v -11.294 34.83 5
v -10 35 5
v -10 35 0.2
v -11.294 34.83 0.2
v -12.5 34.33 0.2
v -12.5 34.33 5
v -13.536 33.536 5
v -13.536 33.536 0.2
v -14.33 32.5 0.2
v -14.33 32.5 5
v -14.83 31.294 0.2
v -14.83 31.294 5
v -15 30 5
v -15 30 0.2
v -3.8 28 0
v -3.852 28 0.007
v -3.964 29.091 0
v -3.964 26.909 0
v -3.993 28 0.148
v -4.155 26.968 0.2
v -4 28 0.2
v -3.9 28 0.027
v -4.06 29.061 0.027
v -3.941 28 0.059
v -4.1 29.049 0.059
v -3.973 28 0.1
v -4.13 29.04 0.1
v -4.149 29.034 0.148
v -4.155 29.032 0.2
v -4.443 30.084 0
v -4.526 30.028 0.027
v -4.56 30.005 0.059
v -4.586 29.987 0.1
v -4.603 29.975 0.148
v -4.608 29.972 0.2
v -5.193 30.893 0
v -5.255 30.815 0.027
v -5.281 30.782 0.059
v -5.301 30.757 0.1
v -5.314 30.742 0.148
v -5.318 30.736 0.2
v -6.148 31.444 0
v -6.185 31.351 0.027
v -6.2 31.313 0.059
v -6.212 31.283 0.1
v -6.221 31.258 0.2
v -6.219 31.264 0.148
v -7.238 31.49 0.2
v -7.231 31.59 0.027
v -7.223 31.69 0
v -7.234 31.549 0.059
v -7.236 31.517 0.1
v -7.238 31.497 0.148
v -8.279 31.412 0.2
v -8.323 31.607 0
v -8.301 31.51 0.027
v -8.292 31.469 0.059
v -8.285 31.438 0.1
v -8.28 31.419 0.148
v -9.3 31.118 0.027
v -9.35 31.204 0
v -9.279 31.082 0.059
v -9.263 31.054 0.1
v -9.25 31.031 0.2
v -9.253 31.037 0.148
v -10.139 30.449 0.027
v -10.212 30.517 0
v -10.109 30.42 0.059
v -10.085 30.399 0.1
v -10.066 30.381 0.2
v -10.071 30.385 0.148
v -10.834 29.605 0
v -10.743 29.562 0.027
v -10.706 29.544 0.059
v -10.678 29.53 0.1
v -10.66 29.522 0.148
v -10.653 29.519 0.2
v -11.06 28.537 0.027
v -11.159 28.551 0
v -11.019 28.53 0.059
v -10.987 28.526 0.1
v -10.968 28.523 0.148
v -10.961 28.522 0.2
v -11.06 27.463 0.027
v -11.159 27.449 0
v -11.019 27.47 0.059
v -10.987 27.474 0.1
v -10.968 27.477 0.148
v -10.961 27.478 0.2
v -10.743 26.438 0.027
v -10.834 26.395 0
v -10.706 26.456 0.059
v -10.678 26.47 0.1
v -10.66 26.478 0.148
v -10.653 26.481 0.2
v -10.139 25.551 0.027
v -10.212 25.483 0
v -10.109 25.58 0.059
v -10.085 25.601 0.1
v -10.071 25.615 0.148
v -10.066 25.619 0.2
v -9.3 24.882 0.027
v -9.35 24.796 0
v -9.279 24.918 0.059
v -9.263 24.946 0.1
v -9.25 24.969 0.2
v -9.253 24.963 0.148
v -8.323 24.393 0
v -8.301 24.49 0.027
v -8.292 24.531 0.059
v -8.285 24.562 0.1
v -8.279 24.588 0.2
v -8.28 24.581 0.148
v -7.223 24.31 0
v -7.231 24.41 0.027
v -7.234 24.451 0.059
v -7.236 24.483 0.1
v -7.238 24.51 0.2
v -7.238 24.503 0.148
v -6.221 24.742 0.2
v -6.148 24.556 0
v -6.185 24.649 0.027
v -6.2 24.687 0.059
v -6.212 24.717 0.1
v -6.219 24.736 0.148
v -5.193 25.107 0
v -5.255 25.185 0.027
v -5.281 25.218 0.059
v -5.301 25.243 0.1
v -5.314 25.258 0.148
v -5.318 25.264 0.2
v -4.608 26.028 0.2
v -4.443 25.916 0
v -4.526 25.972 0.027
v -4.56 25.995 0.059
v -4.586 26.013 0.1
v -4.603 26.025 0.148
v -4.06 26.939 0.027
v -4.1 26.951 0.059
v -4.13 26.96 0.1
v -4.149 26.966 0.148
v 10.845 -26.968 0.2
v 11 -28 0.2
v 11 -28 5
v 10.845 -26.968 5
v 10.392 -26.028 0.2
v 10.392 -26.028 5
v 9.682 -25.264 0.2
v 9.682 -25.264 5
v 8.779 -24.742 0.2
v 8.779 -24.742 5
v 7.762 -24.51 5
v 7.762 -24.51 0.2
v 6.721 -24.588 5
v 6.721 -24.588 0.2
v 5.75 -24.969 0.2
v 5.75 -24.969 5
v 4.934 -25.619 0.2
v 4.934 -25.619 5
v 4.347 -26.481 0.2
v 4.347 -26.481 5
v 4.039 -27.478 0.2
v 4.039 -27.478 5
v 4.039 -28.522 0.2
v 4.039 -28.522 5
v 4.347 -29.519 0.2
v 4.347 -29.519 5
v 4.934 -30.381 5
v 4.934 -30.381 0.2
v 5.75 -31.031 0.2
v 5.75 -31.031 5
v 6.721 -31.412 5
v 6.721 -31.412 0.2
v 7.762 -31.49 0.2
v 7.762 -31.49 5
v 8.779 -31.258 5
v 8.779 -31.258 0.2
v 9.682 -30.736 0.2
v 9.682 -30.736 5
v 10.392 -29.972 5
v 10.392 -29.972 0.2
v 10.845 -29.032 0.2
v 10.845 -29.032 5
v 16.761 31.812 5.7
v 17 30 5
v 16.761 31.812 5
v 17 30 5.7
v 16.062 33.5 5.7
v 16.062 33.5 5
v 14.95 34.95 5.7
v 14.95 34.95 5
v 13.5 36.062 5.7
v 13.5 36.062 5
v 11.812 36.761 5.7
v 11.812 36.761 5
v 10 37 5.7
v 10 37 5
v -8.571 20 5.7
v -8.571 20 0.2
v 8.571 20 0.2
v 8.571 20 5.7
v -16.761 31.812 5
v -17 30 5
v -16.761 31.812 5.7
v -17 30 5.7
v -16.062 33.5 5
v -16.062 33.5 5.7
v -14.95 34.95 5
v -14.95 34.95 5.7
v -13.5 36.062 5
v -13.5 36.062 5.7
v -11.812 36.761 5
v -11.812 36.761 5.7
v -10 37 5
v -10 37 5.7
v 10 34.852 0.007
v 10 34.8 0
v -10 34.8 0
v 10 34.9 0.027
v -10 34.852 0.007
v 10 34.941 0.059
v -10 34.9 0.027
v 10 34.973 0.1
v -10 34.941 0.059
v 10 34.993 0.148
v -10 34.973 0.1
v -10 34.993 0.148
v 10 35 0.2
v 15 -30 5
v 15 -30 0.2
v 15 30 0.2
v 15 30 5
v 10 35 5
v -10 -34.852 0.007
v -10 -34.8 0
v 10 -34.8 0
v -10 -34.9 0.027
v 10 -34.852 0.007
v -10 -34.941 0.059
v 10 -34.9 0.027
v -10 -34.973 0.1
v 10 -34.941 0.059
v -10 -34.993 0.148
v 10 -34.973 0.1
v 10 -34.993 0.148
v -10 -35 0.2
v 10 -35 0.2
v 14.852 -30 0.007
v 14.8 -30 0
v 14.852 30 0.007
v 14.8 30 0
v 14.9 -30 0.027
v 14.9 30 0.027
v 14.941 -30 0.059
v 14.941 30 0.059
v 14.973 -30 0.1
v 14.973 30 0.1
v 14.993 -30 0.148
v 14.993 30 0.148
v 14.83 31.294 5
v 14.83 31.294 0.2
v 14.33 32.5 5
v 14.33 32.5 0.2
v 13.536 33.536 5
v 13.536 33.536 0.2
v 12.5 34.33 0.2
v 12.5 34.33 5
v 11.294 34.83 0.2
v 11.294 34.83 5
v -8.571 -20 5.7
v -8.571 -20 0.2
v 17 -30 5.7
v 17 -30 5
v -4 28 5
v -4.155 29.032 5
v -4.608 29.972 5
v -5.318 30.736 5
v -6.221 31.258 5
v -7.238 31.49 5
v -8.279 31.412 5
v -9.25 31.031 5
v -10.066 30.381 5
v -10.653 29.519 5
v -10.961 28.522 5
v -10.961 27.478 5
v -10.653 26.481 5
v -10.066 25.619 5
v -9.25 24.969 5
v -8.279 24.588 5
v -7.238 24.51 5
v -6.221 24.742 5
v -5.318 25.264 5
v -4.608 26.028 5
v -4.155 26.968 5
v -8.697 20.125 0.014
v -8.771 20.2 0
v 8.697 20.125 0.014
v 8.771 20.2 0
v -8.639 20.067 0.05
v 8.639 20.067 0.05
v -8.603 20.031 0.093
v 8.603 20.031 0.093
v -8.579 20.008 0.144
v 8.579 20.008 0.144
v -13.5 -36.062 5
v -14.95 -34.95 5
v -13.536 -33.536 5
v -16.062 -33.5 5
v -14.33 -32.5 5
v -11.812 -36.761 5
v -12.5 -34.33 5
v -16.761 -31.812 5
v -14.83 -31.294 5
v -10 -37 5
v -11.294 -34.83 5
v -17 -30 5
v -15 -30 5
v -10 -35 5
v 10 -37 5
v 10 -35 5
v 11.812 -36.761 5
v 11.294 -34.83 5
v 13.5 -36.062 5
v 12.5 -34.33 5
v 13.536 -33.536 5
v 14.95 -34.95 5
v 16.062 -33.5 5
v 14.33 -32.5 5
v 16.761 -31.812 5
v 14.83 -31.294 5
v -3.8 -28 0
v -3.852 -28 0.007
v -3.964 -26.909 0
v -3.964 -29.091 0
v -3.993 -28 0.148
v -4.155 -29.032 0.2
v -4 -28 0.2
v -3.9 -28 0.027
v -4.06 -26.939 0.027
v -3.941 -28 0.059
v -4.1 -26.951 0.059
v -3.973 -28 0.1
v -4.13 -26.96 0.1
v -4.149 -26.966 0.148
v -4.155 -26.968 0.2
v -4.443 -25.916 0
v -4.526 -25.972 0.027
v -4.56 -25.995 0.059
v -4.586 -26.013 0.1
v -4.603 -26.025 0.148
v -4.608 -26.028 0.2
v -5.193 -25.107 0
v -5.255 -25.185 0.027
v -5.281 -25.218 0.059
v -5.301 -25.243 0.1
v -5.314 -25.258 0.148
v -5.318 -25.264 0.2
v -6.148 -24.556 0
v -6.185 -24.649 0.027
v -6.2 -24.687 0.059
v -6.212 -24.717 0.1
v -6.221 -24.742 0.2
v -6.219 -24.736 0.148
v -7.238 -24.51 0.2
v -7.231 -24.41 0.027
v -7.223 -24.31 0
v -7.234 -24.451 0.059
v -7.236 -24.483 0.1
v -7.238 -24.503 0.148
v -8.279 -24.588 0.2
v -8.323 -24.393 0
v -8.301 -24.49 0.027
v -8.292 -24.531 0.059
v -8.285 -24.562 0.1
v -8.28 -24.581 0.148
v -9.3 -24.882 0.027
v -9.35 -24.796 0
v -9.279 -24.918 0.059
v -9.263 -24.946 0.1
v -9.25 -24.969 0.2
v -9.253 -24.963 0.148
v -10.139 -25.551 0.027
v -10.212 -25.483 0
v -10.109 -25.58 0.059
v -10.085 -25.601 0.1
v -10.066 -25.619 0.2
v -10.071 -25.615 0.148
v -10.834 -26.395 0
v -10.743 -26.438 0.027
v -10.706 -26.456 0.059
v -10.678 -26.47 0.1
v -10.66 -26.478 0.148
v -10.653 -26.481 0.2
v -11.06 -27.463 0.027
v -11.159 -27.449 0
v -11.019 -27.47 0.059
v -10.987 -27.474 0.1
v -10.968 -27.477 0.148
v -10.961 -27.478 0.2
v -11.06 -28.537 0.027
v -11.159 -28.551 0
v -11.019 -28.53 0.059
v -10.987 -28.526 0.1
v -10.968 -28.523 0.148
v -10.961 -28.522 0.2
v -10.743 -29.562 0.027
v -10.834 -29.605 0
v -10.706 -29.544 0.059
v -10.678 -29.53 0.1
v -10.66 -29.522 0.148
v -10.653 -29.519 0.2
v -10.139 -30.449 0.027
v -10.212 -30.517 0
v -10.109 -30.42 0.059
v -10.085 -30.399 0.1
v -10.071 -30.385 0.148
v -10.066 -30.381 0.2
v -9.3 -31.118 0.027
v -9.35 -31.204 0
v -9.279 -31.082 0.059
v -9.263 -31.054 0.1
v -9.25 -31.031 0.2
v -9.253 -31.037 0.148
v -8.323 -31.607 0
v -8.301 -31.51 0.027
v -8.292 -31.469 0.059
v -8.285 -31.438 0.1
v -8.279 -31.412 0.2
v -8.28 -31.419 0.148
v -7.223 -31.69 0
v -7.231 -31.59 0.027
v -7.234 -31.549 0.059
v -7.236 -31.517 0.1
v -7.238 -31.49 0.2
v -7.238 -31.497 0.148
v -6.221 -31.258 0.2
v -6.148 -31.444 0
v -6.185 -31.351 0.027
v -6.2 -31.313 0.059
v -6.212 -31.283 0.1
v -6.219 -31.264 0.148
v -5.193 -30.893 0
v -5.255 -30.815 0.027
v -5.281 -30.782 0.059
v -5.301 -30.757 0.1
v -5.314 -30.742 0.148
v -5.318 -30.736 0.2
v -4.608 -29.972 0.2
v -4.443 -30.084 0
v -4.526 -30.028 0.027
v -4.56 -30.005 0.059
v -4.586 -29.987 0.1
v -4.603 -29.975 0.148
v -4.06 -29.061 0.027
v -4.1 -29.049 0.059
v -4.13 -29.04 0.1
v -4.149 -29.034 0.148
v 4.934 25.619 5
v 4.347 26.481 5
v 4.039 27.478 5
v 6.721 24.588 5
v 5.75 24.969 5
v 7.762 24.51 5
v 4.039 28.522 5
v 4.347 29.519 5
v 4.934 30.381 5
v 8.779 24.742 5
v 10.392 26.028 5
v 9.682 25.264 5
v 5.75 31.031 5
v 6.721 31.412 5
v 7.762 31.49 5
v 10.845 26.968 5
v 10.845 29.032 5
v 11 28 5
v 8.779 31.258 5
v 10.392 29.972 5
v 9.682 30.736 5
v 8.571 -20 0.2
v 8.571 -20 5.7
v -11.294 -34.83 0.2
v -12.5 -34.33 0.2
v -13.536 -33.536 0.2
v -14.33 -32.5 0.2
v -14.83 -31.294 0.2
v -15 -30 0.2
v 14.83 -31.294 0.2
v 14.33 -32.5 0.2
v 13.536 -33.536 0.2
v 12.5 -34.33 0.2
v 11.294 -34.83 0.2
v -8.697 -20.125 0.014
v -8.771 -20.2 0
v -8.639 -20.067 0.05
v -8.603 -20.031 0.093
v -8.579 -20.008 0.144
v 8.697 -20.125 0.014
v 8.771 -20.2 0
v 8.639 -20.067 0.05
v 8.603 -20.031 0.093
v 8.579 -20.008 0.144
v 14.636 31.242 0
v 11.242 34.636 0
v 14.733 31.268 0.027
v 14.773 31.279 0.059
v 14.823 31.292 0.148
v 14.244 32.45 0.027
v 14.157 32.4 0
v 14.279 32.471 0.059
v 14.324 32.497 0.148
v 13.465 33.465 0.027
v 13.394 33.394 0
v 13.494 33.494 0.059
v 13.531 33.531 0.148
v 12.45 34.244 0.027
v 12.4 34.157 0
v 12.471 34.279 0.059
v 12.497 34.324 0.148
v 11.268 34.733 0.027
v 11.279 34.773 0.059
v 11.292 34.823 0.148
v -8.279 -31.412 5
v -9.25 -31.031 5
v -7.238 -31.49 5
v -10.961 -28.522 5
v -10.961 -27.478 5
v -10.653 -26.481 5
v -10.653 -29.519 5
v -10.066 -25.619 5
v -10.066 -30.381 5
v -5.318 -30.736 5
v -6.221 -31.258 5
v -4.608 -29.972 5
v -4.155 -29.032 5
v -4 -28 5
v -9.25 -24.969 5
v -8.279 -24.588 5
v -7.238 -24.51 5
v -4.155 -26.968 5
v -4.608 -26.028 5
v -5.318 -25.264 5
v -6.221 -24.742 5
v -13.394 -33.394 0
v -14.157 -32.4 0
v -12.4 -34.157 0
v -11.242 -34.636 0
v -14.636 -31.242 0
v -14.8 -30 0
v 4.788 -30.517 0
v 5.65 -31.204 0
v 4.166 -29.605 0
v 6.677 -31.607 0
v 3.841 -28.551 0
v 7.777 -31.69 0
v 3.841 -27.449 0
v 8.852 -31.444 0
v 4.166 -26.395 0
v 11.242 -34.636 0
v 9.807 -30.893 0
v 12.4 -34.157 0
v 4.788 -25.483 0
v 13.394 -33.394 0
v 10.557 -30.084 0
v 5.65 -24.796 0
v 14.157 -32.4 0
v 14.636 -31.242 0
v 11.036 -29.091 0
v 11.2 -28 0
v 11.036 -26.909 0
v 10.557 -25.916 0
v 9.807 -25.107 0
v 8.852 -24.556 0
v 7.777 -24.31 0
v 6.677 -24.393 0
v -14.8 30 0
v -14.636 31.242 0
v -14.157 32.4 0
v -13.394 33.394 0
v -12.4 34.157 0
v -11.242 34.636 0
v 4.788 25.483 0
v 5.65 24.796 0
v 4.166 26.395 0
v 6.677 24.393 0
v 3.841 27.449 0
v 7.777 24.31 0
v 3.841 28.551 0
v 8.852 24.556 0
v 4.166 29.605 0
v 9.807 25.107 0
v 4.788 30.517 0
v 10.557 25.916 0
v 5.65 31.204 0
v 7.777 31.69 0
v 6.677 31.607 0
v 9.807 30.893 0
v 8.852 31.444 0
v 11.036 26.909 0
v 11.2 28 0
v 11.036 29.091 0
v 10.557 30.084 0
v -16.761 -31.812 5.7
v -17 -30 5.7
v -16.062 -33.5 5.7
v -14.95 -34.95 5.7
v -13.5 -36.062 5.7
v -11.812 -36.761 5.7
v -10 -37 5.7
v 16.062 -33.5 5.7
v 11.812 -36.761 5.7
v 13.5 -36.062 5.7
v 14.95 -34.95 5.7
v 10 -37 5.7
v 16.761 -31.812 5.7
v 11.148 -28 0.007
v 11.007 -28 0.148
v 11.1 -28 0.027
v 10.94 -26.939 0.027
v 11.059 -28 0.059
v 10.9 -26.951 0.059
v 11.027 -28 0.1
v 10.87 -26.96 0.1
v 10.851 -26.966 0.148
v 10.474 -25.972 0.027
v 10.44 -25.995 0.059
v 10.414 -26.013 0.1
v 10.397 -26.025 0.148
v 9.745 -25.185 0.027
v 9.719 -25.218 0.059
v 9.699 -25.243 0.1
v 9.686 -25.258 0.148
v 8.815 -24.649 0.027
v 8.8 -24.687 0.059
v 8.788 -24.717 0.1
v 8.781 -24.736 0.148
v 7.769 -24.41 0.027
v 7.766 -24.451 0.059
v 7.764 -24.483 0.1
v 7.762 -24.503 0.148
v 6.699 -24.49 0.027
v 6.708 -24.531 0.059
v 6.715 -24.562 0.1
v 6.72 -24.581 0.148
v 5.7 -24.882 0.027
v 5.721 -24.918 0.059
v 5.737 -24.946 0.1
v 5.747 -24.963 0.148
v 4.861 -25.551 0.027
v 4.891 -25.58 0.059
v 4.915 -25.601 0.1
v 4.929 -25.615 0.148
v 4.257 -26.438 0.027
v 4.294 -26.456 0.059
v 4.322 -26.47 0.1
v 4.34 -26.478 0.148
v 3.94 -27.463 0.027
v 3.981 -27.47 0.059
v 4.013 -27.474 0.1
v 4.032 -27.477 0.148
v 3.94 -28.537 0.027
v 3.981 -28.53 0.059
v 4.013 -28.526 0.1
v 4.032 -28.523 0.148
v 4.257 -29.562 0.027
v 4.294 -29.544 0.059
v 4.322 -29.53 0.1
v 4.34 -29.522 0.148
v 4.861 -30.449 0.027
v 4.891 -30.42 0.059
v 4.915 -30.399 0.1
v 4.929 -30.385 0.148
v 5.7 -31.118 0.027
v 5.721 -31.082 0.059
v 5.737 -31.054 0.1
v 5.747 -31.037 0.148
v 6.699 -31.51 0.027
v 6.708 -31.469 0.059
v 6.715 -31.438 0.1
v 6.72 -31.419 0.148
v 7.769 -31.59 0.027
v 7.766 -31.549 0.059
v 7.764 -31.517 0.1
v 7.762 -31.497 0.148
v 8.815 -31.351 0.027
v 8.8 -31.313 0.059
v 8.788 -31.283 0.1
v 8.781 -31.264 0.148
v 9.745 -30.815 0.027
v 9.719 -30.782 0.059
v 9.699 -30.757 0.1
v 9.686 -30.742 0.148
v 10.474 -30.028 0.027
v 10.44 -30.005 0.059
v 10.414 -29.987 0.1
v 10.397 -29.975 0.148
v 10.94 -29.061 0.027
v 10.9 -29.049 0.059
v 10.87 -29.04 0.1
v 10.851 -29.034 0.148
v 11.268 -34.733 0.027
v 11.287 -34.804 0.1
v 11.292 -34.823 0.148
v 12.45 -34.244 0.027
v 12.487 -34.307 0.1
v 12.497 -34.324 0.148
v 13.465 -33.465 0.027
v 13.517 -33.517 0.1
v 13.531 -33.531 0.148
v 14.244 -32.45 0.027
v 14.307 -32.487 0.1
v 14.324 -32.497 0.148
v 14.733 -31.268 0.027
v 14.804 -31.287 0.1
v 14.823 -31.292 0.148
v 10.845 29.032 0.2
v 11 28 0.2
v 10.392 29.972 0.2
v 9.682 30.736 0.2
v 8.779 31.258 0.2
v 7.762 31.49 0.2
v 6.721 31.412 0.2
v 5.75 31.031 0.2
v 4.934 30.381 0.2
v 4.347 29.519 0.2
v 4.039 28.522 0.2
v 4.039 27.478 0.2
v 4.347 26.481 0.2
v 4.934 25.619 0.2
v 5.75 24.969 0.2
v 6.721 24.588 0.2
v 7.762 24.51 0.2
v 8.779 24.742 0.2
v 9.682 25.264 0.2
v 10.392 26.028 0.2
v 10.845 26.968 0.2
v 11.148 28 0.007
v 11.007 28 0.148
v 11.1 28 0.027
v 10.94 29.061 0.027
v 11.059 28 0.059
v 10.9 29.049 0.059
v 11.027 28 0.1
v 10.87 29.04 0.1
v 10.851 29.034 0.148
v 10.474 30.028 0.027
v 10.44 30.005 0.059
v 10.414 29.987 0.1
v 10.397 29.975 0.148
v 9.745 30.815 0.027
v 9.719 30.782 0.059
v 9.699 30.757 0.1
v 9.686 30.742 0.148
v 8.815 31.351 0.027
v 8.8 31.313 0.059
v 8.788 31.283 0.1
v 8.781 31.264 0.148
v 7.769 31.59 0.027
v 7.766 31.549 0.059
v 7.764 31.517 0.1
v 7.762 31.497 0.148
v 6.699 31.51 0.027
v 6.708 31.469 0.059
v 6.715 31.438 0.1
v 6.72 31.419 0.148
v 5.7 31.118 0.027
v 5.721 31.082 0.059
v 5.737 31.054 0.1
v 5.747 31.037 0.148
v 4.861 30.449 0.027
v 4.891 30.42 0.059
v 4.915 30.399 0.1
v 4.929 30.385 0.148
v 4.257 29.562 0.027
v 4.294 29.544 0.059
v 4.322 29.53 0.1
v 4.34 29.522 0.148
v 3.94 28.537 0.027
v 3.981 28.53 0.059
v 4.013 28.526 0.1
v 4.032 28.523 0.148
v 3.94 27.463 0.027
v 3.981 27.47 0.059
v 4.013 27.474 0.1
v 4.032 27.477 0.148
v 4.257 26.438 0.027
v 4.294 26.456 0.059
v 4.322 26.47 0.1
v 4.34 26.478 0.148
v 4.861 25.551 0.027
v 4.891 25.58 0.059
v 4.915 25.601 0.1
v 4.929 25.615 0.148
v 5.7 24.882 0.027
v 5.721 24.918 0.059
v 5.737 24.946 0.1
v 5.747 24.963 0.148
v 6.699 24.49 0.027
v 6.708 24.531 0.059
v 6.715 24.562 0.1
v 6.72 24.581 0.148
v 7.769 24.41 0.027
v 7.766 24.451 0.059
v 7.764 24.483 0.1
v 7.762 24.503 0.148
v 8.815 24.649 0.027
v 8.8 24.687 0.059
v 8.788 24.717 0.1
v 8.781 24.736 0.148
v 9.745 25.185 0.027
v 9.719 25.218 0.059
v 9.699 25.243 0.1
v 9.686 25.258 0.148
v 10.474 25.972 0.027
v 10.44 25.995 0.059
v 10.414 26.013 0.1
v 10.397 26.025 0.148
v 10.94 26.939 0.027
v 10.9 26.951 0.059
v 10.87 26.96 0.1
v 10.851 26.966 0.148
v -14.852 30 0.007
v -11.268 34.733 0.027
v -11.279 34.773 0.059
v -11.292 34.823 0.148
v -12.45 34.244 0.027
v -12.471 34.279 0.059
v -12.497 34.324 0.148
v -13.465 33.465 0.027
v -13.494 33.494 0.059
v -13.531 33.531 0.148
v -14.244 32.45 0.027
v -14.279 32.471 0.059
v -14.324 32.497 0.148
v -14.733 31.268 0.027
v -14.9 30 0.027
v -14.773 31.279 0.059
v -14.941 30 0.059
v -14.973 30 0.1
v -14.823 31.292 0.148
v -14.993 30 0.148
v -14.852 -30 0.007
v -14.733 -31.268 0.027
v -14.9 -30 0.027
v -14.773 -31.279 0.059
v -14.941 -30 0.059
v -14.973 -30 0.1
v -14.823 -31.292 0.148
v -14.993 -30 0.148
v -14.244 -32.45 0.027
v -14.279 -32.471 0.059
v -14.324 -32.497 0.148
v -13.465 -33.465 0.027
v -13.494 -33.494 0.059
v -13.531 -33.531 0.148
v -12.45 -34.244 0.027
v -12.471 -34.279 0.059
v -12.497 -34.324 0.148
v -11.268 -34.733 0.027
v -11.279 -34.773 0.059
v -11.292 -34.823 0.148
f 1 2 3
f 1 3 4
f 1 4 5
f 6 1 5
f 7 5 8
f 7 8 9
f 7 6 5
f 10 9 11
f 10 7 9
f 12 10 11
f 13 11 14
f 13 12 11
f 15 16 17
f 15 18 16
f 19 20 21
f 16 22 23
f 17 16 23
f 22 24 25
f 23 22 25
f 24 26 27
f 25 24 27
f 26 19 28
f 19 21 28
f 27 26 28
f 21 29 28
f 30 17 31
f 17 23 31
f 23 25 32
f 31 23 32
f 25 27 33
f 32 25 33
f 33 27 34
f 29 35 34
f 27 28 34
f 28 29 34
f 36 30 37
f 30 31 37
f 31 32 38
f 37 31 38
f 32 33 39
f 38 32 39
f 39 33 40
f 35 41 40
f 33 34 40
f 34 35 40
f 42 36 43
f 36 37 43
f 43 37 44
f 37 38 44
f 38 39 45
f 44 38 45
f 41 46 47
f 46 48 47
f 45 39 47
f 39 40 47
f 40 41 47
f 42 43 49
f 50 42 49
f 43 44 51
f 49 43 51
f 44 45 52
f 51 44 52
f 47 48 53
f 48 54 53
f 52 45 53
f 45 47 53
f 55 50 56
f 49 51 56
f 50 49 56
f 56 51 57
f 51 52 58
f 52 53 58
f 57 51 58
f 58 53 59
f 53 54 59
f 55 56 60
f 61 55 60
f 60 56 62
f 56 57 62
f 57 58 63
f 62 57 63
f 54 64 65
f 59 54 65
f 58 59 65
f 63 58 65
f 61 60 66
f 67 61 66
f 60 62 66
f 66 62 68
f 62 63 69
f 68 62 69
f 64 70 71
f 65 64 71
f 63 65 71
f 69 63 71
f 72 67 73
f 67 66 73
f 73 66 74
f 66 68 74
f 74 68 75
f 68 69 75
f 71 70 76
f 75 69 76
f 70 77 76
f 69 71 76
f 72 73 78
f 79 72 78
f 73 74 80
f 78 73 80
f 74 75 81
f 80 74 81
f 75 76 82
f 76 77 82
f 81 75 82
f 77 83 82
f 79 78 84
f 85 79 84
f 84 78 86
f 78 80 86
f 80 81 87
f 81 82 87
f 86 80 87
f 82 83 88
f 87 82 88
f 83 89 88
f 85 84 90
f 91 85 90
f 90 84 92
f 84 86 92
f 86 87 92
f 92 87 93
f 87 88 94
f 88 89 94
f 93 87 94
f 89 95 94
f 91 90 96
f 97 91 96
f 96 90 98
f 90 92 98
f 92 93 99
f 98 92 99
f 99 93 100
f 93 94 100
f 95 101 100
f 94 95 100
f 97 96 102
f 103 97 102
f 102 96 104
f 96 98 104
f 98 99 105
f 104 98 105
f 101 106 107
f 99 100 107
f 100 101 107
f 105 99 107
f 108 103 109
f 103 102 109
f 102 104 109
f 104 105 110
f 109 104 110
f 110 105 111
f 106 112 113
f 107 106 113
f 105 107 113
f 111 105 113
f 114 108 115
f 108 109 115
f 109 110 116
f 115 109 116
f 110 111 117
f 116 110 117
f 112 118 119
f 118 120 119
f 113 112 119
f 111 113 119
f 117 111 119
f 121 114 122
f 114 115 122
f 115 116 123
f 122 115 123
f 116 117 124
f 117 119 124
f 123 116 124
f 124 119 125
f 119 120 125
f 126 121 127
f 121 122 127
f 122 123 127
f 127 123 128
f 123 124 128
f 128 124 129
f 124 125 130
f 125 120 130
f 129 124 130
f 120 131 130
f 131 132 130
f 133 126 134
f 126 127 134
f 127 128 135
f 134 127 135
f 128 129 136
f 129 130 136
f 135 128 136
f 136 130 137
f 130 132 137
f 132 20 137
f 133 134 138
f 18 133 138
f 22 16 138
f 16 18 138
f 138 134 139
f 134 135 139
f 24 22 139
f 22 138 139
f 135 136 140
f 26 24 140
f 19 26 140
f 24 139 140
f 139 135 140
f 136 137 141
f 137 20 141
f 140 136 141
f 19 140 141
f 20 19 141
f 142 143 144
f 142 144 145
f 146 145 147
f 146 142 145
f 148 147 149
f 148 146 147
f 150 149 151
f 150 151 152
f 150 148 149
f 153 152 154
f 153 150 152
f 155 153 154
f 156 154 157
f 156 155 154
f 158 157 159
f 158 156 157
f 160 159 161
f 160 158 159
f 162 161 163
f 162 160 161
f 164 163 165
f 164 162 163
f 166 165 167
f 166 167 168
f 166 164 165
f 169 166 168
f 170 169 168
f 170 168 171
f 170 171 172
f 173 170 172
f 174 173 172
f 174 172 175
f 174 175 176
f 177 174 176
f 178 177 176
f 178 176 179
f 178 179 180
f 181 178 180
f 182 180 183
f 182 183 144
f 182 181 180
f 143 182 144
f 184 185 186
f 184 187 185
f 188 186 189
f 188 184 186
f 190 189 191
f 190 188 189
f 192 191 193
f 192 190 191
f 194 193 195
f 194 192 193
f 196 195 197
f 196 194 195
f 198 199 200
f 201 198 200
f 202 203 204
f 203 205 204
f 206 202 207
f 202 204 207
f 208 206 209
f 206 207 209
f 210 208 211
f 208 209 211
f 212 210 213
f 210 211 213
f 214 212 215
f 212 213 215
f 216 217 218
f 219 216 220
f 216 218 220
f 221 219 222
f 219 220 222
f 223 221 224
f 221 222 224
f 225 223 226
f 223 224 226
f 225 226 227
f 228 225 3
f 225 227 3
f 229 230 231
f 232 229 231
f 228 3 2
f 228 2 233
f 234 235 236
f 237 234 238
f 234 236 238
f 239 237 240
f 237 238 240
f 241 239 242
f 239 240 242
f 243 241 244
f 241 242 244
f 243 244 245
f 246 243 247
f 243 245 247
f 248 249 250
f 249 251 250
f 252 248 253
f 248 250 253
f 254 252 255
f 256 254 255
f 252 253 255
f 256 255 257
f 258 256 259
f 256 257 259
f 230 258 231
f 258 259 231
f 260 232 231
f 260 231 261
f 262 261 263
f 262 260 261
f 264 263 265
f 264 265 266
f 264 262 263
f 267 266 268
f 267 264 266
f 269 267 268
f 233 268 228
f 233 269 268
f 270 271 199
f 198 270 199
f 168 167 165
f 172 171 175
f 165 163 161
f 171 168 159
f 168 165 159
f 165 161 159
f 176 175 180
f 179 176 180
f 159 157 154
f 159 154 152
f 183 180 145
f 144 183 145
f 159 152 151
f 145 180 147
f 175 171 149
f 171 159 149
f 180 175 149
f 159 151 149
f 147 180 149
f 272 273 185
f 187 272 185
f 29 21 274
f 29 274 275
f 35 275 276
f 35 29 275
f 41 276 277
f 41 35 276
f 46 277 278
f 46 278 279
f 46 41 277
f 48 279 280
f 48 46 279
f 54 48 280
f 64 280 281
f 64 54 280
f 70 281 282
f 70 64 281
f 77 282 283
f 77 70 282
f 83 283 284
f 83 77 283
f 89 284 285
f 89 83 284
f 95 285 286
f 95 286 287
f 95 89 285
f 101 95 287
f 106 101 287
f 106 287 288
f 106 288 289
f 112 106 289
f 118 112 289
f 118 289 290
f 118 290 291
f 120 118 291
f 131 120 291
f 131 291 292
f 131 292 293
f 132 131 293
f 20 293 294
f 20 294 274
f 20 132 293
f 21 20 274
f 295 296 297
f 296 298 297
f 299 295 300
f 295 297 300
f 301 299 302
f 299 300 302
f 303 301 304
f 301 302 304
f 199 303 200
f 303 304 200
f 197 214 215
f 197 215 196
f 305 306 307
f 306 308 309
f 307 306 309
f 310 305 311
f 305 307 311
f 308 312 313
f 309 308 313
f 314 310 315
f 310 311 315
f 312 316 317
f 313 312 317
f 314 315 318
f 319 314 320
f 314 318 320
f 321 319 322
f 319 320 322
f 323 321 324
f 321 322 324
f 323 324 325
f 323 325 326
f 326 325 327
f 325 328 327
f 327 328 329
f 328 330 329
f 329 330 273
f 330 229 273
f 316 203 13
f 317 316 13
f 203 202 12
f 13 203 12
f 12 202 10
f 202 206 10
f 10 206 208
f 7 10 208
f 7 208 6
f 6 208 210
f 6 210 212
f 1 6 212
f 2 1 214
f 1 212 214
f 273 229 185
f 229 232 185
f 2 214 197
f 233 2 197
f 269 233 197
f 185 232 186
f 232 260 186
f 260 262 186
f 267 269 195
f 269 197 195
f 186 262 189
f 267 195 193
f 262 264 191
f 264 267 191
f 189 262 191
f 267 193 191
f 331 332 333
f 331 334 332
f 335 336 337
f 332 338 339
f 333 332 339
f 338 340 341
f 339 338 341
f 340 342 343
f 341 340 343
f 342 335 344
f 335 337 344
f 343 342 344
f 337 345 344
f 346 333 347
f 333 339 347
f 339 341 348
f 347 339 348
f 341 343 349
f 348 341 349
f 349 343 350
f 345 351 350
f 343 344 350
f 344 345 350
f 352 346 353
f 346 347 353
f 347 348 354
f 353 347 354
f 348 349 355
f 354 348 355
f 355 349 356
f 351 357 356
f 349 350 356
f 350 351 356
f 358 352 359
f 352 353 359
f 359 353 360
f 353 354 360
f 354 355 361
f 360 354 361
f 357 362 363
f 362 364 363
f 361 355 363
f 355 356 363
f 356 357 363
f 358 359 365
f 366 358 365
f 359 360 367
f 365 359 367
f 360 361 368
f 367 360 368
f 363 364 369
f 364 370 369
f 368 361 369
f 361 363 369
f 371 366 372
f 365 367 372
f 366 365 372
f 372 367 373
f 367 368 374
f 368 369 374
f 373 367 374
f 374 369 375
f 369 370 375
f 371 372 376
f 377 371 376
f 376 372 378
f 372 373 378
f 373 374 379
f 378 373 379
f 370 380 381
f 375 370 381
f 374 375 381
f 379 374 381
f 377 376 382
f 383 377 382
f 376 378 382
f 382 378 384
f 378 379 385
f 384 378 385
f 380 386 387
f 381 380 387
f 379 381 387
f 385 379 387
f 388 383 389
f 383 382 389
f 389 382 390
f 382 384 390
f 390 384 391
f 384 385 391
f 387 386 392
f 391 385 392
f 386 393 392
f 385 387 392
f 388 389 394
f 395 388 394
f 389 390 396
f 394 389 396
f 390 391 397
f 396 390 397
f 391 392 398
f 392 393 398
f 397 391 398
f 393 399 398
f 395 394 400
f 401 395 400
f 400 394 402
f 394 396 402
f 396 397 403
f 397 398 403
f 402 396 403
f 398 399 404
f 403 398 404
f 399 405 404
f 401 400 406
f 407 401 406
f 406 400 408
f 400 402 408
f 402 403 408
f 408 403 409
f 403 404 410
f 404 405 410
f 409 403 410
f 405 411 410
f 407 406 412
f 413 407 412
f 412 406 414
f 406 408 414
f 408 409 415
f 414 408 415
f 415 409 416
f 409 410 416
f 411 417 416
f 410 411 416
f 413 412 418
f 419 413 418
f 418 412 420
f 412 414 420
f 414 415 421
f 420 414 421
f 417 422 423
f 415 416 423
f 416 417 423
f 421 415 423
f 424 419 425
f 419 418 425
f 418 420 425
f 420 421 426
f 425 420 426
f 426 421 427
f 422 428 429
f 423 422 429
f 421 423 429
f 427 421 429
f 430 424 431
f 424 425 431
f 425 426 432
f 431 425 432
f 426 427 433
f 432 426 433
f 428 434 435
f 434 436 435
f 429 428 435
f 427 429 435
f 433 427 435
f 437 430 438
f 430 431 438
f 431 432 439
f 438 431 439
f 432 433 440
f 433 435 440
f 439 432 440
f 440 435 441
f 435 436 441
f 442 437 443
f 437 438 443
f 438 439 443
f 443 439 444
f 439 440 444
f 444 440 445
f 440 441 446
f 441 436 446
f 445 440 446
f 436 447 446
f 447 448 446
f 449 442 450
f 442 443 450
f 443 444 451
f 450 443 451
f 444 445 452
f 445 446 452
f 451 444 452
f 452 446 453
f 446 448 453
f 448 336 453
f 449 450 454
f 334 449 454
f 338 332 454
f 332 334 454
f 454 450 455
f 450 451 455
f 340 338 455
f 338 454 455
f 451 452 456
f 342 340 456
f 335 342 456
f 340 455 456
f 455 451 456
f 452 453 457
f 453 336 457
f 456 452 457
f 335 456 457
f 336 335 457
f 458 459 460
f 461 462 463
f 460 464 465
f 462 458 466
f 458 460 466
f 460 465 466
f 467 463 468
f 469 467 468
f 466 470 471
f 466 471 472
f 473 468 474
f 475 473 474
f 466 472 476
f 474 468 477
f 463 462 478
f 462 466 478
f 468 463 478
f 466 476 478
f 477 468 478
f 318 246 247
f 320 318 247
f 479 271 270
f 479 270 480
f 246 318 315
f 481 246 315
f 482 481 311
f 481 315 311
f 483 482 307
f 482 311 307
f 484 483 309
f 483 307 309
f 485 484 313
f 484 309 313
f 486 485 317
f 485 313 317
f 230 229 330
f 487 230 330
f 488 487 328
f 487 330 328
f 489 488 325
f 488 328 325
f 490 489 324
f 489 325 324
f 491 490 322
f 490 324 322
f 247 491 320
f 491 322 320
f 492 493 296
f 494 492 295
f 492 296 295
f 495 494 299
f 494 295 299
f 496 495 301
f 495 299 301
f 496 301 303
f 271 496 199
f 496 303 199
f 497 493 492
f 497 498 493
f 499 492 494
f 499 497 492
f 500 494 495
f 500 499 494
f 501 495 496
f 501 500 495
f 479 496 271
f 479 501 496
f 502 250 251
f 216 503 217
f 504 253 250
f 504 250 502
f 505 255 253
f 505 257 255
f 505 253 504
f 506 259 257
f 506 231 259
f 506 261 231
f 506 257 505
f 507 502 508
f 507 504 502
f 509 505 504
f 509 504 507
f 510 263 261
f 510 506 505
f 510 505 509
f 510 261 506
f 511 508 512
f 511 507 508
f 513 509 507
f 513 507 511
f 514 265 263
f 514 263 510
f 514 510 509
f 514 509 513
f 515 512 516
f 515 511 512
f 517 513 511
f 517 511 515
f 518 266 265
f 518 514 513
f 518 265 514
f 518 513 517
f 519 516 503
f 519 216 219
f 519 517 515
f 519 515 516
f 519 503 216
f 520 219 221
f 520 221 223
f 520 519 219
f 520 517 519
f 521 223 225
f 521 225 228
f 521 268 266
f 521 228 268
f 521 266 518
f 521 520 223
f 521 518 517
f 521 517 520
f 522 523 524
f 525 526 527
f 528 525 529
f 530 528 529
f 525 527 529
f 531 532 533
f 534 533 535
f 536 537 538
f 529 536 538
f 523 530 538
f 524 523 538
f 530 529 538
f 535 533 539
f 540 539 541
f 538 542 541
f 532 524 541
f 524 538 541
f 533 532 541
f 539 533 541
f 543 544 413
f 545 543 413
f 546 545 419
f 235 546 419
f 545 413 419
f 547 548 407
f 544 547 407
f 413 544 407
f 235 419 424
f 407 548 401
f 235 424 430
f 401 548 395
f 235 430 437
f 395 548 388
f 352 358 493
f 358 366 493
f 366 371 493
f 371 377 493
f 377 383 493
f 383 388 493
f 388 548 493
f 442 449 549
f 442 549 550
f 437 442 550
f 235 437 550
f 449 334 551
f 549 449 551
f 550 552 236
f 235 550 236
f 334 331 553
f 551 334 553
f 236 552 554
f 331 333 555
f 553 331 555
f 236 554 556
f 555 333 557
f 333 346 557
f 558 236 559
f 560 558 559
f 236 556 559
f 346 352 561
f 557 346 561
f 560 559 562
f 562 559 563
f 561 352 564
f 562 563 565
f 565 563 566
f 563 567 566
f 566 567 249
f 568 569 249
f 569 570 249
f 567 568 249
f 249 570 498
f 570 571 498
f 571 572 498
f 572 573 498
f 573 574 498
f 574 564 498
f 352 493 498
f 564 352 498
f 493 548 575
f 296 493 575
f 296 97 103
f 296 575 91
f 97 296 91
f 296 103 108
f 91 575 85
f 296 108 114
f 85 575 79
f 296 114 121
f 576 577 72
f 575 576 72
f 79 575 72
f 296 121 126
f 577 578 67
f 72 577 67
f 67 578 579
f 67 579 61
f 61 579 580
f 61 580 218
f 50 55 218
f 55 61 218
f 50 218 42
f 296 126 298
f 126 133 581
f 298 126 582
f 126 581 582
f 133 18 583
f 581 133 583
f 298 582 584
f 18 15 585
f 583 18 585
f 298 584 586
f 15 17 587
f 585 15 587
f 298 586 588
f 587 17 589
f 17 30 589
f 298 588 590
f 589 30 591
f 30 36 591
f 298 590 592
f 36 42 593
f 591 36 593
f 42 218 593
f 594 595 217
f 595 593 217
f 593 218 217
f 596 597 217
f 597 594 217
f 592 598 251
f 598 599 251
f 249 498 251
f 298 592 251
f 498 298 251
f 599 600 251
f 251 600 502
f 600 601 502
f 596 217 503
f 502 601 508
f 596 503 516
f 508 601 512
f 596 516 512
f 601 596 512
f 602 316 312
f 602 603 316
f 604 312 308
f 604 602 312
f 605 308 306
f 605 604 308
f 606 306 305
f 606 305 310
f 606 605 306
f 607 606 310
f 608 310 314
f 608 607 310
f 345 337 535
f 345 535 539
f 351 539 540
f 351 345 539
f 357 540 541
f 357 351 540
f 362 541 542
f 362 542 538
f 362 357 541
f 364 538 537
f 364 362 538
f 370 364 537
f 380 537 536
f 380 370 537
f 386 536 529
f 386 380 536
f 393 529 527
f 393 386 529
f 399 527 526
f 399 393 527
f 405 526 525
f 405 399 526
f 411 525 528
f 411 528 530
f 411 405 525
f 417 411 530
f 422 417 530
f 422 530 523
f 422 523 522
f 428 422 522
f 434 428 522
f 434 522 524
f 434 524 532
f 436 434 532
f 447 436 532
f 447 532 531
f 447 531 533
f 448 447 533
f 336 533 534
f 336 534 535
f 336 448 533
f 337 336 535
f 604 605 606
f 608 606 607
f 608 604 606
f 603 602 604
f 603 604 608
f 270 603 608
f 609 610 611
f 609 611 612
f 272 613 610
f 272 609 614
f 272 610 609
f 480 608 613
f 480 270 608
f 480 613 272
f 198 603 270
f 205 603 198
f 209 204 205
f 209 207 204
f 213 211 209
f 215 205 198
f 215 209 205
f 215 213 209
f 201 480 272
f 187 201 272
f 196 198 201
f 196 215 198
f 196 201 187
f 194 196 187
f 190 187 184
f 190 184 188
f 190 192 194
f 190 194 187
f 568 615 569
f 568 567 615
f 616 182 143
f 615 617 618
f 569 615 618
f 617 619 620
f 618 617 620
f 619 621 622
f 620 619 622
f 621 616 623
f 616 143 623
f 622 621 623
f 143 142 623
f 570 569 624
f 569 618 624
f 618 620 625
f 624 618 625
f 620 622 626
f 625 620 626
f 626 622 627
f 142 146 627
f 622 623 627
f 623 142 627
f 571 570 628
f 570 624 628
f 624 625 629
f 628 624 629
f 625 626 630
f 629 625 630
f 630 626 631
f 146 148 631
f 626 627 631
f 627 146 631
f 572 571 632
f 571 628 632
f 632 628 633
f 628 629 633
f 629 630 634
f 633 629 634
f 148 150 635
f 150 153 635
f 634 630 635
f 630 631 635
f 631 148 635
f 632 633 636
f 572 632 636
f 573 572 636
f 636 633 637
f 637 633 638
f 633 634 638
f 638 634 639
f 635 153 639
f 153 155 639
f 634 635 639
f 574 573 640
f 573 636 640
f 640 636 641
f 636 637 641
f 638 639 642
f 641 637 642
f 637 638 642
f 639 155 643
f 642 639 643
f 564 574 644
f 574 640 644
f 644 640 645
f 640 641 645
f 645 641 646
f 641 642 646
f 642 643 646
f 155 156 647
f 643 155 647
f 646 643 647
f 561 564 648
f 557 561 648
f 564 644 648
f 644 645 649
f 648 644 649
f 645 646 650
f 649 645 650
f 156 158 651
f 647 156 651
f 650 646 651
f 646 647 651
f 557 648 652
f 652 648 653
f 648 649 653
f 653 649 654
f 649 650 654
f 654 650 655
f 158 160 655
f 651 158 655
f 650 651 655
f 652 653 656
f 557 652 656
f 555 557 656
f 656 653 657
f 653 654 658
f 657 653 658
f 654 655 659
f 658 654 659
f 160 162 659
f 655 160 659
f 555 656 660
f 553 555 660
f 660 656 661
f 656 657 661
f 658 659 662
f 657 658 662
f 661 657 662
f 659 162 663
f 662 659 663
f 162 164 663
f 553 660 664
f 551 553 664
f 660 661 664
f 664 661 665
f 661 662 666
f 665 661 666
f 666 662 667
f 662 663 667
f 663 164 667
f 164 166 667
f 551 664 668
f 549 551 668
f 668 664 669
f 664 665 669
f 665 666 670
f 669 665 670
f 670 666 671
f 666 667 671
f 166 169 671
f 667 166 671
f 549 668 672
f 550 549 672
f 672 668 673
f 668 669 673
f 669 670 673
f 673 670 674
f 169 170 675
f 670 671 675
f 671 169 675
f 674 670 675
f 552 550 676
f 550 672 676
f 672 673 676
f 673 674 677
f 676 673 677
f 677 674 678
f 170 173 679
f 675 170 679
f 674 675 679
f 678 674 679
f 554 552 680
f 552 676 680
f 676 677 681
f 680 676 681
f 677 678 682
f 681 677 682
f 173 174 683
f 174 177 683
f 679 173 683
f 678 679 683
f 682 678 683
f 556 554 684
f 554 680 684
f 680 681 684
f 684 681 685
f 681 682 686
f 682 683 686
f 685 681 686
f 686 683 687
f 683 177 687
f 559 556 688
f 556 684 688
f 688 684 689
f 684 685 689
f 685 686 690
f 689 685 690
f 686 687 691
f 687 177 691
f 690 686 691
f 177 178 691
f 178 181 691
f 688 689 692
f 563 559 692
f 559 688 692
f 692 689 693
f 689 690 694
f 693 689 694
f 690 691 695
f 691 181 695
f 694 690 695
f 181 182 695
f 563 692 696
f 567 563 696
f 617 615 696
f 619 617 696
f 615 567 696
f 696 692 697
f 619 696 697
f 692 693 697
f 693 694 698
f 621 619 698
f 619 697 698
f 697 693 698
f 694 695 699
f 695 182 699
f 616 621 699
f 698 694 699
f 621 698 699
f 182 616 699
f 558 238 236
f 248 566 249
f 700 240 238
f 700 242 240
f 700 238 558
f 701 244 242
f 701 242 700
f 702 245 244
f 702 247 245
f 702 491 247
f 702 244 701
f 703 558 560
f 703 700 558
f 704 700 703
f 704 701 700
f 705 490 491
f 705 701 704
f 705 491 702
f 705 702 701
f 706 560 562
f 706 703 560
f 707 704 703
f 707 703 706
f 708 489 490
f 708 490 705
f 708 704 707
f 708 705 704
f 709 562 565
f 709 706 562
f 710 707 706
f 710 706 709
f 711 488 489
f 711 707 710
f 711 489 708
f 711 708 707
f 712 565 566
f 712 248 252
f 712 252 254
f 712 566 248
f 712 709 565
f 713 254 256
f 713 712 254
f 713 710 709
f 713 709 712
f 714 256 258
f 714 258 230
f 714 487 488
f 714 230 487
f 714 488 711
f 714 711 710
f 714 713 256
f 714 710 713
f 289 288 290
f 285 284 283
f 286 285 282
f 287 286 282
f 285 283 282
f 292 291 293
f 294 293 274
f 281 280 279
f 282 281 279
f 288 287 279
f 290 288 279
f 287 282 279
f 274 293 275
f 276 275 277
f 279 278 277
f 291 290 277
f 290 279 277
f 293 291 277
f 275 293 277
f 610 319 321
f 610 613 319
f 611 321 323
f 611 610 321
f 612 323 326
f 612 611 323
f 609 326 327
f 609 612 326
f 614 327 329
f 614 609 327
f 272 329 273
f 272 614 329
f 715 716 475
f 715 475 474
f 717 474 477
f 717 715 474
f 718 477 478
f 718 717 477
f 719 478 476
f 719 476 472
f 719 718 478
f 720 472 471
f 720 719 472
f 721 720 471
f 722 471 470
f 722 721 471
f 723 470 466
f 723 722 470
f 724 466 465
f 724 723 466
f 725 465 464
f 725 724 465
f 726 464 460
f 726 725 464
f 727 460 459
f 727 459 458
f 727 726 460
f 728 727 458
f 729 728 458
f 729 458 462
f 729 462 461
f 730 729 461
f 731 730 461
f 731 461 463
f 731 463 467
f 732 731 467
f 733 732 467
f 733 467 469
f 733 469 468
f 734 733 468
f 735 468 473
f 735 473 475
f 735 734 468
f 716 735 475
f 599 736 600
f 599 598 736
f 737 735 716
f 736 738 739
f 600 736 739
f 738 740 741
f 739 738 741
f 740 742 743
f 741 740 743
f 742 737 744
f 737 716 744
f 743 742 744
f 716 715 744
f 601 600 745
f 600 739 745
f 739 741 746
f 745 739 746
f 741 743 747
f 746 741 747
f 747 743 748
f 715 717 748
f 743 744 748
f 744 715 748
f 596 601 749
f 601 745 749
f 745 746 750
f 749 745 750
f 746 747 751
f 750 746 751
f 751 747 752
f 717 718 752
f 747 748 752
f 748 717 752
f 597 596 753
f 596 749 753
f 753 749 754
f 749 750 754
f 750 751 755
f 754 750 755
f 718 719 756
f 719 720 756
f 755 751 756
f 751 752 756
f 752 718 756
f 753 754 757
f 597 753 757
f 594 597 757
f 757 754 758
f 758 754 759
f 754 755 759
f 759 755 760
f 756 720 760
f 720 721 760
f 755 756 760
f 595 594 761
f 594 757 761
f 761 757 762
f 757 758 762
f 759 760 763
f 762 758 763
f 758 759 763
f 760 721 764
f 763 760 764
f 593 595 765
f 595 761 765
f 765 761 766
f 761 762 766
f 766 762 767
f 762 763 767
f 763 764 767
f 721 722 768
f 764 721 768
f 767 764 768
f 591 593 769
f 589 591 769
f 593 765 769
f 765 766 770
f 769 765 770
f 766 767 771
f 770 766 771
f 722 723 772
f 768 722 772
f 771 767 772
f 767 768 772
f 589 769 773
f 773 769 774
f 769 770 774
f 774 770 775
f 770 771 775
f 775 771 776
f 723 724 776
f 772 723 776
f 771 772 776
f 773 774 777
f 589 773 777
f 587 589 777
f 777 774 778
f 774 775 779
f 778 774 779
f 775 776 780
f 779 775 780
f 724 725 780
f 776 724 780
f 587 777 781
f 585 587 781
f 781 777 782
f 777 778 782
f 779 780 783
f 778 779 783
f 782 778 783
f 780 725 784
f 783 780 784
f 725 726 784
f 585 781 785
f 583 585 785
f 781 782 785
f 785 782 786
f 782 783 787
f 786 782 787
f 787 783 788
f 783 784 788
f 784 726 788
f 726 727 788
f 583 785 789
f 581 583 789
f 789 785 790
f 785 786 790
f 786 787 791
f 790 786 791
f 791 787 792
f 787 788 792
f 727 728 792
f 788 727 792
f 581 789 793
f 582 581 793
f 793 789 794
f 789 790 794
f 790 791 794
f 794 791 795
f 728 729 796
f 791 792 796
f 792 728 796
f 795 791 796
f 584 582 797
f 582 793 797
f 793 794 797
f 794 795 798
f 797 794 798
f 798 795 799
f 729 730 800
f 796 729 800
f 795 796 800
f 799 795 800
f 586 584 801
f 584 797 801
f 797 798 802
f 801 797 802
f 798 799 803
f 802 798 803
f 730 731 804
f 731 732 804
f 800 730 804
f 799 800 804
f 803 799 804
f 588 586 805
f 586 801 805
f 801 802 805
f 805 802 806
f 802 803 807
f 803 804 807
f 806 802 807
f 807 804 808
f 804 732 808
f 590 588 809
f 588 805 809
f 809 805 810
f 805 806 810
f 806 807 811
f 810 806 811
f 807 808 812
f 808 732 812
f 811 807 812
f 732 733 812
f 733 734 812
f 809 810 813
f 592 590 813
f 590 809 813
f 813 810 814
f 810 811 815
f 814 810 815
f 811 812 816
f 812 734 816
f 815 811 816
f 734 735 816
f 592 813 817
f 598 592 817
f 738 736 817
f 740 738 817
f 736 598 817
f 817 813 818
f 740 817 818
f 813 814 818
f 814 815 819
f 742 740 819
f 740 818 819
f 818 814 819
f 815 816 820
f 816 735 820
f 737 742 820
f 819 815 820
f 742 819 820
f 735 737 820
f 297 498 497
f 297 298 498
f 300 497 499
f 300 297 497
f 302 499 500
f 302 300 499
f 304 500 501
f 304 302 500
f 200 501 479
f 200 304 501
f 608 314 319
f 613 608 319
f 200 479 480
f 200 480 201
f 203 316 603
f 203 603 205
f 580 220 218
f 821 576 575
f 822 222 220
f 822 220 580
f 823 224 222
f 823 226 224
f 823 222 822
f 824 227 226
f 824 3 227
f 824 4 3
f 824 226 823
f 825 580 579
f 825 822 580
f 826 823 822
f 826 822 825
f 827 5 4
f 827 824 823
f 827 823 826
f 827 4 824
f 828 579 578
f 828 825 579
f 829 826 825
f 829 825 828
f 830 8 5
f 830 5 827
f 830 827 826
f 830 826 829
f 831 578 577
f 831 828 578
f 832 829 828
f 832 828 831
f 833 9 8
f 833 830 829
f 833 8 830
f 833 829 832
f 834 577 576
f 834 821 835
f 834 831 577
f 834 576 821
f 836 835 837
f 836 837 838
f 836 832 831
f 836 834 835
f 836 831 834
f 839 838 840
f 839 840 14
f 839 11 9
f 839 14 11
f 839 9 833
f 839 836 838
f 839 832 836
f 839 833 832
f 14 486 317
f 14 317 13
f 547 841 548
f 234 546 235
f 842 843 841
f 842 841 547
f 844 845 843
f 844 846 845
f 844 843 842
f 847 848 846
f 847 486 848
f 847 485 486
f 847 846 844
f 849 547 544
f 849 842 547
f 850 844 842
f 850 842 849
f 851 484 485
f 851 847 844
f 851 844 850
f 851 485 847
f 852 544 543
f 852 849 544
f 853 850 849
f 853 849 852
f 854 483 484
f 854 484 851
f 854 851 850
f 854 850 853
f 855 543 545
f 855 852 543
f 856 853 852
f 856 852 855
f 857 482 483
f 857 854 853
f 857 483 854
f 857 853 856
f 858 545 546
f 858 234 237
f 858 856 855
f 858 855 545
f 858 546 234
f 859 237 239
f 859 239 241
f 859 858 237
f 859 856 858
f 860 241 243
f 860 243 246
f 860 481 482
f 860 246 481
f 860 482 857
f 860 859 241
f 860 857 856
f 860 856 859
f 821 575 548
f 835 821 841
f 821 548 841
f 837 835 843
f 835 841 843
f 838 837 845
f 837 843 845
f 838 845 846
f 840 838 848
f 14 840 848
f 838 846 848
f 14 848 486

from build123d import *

# Parameters (mm, degrees)
SKETCH4_W           = 30
SKETCH4_H           = 70
SKETCH4_R           = 3.5
SKETCH4_W_2         = 17.142857142
SKETCH4_H_2         = 40
BOSS_EXTRUDE1_DEPTH = 5
SKETCH5_W           = 34
SKETCH5_H           = 74
SKETCH5_W_2         = 30
SKETCH5_H_2         = 70
SKETCH5_R           = 3.5
SKETCH5_W_3         = 17.142857142
SKETCH5_H_3         = 40
BOSS_EXTRUDE2_DEPTH = 0.7
FILLET1_R           = 5
FILLET2_R           = 0.2
FILLET3_R           = 7


with BuildPart() as part:
    # Sketch4 → Boss-Extrude1 (new body)
    with BuildSketch(Plane.XY):
        Rectangle(SKETCH4_W, SKETCH4_H)
        with Locations((7.5, 28)):
            Circle(SKETCH4_R, mode=Mode.SUBTRACT)
        with Locations((-7.5, 28)):
            Circle(SKETCH4_R, mode=Mode.SUBTRACT)
        with Locations((7.5, -28)):
            Circle(SKETCH4_R, mode=Mode.SUBTRACT)
        with Locations((-7.5, -28)):
            Circle(SKETCH4_R, mode=Mode.SUBTRACT)
        Rectangle(SKETCH4_W_2, SKETCH4_H_2, mode=Mode.SUBTRACT)
    extrude(amount=BOSS_EXTRUDE1_DEPTH)

    # Sketch5 → Boss-Extrude2 (add)
    # profile 1 of 6: a face of its own
    with BuildSketch(Plane.XY.offset(5)):
        Rectangle(SKETCH5_W, SKETCH5_H)
        Rectangle(SKETCH5_W_2, SKETCH5_H_2, mode=Mode.SUBTRACT)
    # profile 2 of 6: a face of its own
    with BuildSketch(Plane.XY.offset(5)):
        Rectangle(SKETCH5_W_2, SKETCH5_H_2)
        with Locations((-7.5, 28)):
            Circle(SKETCH5_R, mode=Mode.SUBTRACT)
        with Locations((-7.5, -28)):
            Circle(SKETCH5_R, mode=Mode.SUBTRACT)
        with Locations((7.5, -28)):
            Circle(SKETCH5_R, mode=Mode.SUBTRACT)
        with Locations((7.5, 28)):
            Circle(SKETCH5_R, mode=Mode.SUBTRACT)
        Rectangle(SKETCH5_W_3, SKETCH5_H_3, mode=Mode.SUBTRACT)
    # profile 3 of 6: a face of its own
    with BuildSketch(Plane.XY.offset(5)):
        with Locations((7.5, -28)):
            Circle(SKETCH5_R)
    # profile 4 of 6: a face of its own
    with BuildSketch(Plane.XY.offset(5)):
        with Locations((-7.5, -28)):
            Circle(SKETCH5_R)
    # profile 5 of 6: a face of its own
    with BuildSketch(Plane.XY.offset(5)):
        with Locations((7.5, 28)):
            Circle(SKETCH5_R)
    # profile 6 of 6: a face of its own
    with BuildSketch(Plane.XY.offset(5)):
        with Locations((-7.5, 28)):
            Circle(SKETCH5_R)
    extrude(amount=BOSS_EXTRUDE2_DEPTH)

    # Fillet1
    fillet1_edges = [part.edges().sort_by_distance(p)[0] for p in [
        (-15, 35, 2.5),
        (15, 35, 2.5),
        (15, -35, 2.5),
        (-15, -35, 2.5),
    ]]
    fillet(fillet1_edges, radius=FILLET1_R)

    # Fillet2
    fillet2_edges = [part.edges().sort_by_distance(p)[0] for p in [
        (-11, -28, 0),
        (4, -28, 0),
        (8.571428571, 0, 0),
        (0, 20, 0),
        (-8.571428571, 0, 0),
        (0, -20, 0),
        (-11, 28, 0),
        (4, 28, 0),
        (15, 0, 0),
        (-15, 0, 0),
        (0, 35, 0),
        (0, -35, 0),
        (13.535533906, 33.535533906, 0),
        (-13.535533906, 33.535533906, 0),
        (-13.535533906, -33.535533906, 0),
        (13.535533906, -33.535533906, 0),
    ]]
    fillet(fillet2_edges, radius=FILLET2_R)

    # Fillet3
    fillet3_edges = [part.edges().sort_by_distance(p)[0] for p in [
        (17, 37, 5.35),
        (-17, 37, 5.35),
        (-17, -37, 5.35),
        (17, -37, 5.35),
    ]]
    fillet(fillet3_edges, radius=FILLET3_R)


solid = part.part
